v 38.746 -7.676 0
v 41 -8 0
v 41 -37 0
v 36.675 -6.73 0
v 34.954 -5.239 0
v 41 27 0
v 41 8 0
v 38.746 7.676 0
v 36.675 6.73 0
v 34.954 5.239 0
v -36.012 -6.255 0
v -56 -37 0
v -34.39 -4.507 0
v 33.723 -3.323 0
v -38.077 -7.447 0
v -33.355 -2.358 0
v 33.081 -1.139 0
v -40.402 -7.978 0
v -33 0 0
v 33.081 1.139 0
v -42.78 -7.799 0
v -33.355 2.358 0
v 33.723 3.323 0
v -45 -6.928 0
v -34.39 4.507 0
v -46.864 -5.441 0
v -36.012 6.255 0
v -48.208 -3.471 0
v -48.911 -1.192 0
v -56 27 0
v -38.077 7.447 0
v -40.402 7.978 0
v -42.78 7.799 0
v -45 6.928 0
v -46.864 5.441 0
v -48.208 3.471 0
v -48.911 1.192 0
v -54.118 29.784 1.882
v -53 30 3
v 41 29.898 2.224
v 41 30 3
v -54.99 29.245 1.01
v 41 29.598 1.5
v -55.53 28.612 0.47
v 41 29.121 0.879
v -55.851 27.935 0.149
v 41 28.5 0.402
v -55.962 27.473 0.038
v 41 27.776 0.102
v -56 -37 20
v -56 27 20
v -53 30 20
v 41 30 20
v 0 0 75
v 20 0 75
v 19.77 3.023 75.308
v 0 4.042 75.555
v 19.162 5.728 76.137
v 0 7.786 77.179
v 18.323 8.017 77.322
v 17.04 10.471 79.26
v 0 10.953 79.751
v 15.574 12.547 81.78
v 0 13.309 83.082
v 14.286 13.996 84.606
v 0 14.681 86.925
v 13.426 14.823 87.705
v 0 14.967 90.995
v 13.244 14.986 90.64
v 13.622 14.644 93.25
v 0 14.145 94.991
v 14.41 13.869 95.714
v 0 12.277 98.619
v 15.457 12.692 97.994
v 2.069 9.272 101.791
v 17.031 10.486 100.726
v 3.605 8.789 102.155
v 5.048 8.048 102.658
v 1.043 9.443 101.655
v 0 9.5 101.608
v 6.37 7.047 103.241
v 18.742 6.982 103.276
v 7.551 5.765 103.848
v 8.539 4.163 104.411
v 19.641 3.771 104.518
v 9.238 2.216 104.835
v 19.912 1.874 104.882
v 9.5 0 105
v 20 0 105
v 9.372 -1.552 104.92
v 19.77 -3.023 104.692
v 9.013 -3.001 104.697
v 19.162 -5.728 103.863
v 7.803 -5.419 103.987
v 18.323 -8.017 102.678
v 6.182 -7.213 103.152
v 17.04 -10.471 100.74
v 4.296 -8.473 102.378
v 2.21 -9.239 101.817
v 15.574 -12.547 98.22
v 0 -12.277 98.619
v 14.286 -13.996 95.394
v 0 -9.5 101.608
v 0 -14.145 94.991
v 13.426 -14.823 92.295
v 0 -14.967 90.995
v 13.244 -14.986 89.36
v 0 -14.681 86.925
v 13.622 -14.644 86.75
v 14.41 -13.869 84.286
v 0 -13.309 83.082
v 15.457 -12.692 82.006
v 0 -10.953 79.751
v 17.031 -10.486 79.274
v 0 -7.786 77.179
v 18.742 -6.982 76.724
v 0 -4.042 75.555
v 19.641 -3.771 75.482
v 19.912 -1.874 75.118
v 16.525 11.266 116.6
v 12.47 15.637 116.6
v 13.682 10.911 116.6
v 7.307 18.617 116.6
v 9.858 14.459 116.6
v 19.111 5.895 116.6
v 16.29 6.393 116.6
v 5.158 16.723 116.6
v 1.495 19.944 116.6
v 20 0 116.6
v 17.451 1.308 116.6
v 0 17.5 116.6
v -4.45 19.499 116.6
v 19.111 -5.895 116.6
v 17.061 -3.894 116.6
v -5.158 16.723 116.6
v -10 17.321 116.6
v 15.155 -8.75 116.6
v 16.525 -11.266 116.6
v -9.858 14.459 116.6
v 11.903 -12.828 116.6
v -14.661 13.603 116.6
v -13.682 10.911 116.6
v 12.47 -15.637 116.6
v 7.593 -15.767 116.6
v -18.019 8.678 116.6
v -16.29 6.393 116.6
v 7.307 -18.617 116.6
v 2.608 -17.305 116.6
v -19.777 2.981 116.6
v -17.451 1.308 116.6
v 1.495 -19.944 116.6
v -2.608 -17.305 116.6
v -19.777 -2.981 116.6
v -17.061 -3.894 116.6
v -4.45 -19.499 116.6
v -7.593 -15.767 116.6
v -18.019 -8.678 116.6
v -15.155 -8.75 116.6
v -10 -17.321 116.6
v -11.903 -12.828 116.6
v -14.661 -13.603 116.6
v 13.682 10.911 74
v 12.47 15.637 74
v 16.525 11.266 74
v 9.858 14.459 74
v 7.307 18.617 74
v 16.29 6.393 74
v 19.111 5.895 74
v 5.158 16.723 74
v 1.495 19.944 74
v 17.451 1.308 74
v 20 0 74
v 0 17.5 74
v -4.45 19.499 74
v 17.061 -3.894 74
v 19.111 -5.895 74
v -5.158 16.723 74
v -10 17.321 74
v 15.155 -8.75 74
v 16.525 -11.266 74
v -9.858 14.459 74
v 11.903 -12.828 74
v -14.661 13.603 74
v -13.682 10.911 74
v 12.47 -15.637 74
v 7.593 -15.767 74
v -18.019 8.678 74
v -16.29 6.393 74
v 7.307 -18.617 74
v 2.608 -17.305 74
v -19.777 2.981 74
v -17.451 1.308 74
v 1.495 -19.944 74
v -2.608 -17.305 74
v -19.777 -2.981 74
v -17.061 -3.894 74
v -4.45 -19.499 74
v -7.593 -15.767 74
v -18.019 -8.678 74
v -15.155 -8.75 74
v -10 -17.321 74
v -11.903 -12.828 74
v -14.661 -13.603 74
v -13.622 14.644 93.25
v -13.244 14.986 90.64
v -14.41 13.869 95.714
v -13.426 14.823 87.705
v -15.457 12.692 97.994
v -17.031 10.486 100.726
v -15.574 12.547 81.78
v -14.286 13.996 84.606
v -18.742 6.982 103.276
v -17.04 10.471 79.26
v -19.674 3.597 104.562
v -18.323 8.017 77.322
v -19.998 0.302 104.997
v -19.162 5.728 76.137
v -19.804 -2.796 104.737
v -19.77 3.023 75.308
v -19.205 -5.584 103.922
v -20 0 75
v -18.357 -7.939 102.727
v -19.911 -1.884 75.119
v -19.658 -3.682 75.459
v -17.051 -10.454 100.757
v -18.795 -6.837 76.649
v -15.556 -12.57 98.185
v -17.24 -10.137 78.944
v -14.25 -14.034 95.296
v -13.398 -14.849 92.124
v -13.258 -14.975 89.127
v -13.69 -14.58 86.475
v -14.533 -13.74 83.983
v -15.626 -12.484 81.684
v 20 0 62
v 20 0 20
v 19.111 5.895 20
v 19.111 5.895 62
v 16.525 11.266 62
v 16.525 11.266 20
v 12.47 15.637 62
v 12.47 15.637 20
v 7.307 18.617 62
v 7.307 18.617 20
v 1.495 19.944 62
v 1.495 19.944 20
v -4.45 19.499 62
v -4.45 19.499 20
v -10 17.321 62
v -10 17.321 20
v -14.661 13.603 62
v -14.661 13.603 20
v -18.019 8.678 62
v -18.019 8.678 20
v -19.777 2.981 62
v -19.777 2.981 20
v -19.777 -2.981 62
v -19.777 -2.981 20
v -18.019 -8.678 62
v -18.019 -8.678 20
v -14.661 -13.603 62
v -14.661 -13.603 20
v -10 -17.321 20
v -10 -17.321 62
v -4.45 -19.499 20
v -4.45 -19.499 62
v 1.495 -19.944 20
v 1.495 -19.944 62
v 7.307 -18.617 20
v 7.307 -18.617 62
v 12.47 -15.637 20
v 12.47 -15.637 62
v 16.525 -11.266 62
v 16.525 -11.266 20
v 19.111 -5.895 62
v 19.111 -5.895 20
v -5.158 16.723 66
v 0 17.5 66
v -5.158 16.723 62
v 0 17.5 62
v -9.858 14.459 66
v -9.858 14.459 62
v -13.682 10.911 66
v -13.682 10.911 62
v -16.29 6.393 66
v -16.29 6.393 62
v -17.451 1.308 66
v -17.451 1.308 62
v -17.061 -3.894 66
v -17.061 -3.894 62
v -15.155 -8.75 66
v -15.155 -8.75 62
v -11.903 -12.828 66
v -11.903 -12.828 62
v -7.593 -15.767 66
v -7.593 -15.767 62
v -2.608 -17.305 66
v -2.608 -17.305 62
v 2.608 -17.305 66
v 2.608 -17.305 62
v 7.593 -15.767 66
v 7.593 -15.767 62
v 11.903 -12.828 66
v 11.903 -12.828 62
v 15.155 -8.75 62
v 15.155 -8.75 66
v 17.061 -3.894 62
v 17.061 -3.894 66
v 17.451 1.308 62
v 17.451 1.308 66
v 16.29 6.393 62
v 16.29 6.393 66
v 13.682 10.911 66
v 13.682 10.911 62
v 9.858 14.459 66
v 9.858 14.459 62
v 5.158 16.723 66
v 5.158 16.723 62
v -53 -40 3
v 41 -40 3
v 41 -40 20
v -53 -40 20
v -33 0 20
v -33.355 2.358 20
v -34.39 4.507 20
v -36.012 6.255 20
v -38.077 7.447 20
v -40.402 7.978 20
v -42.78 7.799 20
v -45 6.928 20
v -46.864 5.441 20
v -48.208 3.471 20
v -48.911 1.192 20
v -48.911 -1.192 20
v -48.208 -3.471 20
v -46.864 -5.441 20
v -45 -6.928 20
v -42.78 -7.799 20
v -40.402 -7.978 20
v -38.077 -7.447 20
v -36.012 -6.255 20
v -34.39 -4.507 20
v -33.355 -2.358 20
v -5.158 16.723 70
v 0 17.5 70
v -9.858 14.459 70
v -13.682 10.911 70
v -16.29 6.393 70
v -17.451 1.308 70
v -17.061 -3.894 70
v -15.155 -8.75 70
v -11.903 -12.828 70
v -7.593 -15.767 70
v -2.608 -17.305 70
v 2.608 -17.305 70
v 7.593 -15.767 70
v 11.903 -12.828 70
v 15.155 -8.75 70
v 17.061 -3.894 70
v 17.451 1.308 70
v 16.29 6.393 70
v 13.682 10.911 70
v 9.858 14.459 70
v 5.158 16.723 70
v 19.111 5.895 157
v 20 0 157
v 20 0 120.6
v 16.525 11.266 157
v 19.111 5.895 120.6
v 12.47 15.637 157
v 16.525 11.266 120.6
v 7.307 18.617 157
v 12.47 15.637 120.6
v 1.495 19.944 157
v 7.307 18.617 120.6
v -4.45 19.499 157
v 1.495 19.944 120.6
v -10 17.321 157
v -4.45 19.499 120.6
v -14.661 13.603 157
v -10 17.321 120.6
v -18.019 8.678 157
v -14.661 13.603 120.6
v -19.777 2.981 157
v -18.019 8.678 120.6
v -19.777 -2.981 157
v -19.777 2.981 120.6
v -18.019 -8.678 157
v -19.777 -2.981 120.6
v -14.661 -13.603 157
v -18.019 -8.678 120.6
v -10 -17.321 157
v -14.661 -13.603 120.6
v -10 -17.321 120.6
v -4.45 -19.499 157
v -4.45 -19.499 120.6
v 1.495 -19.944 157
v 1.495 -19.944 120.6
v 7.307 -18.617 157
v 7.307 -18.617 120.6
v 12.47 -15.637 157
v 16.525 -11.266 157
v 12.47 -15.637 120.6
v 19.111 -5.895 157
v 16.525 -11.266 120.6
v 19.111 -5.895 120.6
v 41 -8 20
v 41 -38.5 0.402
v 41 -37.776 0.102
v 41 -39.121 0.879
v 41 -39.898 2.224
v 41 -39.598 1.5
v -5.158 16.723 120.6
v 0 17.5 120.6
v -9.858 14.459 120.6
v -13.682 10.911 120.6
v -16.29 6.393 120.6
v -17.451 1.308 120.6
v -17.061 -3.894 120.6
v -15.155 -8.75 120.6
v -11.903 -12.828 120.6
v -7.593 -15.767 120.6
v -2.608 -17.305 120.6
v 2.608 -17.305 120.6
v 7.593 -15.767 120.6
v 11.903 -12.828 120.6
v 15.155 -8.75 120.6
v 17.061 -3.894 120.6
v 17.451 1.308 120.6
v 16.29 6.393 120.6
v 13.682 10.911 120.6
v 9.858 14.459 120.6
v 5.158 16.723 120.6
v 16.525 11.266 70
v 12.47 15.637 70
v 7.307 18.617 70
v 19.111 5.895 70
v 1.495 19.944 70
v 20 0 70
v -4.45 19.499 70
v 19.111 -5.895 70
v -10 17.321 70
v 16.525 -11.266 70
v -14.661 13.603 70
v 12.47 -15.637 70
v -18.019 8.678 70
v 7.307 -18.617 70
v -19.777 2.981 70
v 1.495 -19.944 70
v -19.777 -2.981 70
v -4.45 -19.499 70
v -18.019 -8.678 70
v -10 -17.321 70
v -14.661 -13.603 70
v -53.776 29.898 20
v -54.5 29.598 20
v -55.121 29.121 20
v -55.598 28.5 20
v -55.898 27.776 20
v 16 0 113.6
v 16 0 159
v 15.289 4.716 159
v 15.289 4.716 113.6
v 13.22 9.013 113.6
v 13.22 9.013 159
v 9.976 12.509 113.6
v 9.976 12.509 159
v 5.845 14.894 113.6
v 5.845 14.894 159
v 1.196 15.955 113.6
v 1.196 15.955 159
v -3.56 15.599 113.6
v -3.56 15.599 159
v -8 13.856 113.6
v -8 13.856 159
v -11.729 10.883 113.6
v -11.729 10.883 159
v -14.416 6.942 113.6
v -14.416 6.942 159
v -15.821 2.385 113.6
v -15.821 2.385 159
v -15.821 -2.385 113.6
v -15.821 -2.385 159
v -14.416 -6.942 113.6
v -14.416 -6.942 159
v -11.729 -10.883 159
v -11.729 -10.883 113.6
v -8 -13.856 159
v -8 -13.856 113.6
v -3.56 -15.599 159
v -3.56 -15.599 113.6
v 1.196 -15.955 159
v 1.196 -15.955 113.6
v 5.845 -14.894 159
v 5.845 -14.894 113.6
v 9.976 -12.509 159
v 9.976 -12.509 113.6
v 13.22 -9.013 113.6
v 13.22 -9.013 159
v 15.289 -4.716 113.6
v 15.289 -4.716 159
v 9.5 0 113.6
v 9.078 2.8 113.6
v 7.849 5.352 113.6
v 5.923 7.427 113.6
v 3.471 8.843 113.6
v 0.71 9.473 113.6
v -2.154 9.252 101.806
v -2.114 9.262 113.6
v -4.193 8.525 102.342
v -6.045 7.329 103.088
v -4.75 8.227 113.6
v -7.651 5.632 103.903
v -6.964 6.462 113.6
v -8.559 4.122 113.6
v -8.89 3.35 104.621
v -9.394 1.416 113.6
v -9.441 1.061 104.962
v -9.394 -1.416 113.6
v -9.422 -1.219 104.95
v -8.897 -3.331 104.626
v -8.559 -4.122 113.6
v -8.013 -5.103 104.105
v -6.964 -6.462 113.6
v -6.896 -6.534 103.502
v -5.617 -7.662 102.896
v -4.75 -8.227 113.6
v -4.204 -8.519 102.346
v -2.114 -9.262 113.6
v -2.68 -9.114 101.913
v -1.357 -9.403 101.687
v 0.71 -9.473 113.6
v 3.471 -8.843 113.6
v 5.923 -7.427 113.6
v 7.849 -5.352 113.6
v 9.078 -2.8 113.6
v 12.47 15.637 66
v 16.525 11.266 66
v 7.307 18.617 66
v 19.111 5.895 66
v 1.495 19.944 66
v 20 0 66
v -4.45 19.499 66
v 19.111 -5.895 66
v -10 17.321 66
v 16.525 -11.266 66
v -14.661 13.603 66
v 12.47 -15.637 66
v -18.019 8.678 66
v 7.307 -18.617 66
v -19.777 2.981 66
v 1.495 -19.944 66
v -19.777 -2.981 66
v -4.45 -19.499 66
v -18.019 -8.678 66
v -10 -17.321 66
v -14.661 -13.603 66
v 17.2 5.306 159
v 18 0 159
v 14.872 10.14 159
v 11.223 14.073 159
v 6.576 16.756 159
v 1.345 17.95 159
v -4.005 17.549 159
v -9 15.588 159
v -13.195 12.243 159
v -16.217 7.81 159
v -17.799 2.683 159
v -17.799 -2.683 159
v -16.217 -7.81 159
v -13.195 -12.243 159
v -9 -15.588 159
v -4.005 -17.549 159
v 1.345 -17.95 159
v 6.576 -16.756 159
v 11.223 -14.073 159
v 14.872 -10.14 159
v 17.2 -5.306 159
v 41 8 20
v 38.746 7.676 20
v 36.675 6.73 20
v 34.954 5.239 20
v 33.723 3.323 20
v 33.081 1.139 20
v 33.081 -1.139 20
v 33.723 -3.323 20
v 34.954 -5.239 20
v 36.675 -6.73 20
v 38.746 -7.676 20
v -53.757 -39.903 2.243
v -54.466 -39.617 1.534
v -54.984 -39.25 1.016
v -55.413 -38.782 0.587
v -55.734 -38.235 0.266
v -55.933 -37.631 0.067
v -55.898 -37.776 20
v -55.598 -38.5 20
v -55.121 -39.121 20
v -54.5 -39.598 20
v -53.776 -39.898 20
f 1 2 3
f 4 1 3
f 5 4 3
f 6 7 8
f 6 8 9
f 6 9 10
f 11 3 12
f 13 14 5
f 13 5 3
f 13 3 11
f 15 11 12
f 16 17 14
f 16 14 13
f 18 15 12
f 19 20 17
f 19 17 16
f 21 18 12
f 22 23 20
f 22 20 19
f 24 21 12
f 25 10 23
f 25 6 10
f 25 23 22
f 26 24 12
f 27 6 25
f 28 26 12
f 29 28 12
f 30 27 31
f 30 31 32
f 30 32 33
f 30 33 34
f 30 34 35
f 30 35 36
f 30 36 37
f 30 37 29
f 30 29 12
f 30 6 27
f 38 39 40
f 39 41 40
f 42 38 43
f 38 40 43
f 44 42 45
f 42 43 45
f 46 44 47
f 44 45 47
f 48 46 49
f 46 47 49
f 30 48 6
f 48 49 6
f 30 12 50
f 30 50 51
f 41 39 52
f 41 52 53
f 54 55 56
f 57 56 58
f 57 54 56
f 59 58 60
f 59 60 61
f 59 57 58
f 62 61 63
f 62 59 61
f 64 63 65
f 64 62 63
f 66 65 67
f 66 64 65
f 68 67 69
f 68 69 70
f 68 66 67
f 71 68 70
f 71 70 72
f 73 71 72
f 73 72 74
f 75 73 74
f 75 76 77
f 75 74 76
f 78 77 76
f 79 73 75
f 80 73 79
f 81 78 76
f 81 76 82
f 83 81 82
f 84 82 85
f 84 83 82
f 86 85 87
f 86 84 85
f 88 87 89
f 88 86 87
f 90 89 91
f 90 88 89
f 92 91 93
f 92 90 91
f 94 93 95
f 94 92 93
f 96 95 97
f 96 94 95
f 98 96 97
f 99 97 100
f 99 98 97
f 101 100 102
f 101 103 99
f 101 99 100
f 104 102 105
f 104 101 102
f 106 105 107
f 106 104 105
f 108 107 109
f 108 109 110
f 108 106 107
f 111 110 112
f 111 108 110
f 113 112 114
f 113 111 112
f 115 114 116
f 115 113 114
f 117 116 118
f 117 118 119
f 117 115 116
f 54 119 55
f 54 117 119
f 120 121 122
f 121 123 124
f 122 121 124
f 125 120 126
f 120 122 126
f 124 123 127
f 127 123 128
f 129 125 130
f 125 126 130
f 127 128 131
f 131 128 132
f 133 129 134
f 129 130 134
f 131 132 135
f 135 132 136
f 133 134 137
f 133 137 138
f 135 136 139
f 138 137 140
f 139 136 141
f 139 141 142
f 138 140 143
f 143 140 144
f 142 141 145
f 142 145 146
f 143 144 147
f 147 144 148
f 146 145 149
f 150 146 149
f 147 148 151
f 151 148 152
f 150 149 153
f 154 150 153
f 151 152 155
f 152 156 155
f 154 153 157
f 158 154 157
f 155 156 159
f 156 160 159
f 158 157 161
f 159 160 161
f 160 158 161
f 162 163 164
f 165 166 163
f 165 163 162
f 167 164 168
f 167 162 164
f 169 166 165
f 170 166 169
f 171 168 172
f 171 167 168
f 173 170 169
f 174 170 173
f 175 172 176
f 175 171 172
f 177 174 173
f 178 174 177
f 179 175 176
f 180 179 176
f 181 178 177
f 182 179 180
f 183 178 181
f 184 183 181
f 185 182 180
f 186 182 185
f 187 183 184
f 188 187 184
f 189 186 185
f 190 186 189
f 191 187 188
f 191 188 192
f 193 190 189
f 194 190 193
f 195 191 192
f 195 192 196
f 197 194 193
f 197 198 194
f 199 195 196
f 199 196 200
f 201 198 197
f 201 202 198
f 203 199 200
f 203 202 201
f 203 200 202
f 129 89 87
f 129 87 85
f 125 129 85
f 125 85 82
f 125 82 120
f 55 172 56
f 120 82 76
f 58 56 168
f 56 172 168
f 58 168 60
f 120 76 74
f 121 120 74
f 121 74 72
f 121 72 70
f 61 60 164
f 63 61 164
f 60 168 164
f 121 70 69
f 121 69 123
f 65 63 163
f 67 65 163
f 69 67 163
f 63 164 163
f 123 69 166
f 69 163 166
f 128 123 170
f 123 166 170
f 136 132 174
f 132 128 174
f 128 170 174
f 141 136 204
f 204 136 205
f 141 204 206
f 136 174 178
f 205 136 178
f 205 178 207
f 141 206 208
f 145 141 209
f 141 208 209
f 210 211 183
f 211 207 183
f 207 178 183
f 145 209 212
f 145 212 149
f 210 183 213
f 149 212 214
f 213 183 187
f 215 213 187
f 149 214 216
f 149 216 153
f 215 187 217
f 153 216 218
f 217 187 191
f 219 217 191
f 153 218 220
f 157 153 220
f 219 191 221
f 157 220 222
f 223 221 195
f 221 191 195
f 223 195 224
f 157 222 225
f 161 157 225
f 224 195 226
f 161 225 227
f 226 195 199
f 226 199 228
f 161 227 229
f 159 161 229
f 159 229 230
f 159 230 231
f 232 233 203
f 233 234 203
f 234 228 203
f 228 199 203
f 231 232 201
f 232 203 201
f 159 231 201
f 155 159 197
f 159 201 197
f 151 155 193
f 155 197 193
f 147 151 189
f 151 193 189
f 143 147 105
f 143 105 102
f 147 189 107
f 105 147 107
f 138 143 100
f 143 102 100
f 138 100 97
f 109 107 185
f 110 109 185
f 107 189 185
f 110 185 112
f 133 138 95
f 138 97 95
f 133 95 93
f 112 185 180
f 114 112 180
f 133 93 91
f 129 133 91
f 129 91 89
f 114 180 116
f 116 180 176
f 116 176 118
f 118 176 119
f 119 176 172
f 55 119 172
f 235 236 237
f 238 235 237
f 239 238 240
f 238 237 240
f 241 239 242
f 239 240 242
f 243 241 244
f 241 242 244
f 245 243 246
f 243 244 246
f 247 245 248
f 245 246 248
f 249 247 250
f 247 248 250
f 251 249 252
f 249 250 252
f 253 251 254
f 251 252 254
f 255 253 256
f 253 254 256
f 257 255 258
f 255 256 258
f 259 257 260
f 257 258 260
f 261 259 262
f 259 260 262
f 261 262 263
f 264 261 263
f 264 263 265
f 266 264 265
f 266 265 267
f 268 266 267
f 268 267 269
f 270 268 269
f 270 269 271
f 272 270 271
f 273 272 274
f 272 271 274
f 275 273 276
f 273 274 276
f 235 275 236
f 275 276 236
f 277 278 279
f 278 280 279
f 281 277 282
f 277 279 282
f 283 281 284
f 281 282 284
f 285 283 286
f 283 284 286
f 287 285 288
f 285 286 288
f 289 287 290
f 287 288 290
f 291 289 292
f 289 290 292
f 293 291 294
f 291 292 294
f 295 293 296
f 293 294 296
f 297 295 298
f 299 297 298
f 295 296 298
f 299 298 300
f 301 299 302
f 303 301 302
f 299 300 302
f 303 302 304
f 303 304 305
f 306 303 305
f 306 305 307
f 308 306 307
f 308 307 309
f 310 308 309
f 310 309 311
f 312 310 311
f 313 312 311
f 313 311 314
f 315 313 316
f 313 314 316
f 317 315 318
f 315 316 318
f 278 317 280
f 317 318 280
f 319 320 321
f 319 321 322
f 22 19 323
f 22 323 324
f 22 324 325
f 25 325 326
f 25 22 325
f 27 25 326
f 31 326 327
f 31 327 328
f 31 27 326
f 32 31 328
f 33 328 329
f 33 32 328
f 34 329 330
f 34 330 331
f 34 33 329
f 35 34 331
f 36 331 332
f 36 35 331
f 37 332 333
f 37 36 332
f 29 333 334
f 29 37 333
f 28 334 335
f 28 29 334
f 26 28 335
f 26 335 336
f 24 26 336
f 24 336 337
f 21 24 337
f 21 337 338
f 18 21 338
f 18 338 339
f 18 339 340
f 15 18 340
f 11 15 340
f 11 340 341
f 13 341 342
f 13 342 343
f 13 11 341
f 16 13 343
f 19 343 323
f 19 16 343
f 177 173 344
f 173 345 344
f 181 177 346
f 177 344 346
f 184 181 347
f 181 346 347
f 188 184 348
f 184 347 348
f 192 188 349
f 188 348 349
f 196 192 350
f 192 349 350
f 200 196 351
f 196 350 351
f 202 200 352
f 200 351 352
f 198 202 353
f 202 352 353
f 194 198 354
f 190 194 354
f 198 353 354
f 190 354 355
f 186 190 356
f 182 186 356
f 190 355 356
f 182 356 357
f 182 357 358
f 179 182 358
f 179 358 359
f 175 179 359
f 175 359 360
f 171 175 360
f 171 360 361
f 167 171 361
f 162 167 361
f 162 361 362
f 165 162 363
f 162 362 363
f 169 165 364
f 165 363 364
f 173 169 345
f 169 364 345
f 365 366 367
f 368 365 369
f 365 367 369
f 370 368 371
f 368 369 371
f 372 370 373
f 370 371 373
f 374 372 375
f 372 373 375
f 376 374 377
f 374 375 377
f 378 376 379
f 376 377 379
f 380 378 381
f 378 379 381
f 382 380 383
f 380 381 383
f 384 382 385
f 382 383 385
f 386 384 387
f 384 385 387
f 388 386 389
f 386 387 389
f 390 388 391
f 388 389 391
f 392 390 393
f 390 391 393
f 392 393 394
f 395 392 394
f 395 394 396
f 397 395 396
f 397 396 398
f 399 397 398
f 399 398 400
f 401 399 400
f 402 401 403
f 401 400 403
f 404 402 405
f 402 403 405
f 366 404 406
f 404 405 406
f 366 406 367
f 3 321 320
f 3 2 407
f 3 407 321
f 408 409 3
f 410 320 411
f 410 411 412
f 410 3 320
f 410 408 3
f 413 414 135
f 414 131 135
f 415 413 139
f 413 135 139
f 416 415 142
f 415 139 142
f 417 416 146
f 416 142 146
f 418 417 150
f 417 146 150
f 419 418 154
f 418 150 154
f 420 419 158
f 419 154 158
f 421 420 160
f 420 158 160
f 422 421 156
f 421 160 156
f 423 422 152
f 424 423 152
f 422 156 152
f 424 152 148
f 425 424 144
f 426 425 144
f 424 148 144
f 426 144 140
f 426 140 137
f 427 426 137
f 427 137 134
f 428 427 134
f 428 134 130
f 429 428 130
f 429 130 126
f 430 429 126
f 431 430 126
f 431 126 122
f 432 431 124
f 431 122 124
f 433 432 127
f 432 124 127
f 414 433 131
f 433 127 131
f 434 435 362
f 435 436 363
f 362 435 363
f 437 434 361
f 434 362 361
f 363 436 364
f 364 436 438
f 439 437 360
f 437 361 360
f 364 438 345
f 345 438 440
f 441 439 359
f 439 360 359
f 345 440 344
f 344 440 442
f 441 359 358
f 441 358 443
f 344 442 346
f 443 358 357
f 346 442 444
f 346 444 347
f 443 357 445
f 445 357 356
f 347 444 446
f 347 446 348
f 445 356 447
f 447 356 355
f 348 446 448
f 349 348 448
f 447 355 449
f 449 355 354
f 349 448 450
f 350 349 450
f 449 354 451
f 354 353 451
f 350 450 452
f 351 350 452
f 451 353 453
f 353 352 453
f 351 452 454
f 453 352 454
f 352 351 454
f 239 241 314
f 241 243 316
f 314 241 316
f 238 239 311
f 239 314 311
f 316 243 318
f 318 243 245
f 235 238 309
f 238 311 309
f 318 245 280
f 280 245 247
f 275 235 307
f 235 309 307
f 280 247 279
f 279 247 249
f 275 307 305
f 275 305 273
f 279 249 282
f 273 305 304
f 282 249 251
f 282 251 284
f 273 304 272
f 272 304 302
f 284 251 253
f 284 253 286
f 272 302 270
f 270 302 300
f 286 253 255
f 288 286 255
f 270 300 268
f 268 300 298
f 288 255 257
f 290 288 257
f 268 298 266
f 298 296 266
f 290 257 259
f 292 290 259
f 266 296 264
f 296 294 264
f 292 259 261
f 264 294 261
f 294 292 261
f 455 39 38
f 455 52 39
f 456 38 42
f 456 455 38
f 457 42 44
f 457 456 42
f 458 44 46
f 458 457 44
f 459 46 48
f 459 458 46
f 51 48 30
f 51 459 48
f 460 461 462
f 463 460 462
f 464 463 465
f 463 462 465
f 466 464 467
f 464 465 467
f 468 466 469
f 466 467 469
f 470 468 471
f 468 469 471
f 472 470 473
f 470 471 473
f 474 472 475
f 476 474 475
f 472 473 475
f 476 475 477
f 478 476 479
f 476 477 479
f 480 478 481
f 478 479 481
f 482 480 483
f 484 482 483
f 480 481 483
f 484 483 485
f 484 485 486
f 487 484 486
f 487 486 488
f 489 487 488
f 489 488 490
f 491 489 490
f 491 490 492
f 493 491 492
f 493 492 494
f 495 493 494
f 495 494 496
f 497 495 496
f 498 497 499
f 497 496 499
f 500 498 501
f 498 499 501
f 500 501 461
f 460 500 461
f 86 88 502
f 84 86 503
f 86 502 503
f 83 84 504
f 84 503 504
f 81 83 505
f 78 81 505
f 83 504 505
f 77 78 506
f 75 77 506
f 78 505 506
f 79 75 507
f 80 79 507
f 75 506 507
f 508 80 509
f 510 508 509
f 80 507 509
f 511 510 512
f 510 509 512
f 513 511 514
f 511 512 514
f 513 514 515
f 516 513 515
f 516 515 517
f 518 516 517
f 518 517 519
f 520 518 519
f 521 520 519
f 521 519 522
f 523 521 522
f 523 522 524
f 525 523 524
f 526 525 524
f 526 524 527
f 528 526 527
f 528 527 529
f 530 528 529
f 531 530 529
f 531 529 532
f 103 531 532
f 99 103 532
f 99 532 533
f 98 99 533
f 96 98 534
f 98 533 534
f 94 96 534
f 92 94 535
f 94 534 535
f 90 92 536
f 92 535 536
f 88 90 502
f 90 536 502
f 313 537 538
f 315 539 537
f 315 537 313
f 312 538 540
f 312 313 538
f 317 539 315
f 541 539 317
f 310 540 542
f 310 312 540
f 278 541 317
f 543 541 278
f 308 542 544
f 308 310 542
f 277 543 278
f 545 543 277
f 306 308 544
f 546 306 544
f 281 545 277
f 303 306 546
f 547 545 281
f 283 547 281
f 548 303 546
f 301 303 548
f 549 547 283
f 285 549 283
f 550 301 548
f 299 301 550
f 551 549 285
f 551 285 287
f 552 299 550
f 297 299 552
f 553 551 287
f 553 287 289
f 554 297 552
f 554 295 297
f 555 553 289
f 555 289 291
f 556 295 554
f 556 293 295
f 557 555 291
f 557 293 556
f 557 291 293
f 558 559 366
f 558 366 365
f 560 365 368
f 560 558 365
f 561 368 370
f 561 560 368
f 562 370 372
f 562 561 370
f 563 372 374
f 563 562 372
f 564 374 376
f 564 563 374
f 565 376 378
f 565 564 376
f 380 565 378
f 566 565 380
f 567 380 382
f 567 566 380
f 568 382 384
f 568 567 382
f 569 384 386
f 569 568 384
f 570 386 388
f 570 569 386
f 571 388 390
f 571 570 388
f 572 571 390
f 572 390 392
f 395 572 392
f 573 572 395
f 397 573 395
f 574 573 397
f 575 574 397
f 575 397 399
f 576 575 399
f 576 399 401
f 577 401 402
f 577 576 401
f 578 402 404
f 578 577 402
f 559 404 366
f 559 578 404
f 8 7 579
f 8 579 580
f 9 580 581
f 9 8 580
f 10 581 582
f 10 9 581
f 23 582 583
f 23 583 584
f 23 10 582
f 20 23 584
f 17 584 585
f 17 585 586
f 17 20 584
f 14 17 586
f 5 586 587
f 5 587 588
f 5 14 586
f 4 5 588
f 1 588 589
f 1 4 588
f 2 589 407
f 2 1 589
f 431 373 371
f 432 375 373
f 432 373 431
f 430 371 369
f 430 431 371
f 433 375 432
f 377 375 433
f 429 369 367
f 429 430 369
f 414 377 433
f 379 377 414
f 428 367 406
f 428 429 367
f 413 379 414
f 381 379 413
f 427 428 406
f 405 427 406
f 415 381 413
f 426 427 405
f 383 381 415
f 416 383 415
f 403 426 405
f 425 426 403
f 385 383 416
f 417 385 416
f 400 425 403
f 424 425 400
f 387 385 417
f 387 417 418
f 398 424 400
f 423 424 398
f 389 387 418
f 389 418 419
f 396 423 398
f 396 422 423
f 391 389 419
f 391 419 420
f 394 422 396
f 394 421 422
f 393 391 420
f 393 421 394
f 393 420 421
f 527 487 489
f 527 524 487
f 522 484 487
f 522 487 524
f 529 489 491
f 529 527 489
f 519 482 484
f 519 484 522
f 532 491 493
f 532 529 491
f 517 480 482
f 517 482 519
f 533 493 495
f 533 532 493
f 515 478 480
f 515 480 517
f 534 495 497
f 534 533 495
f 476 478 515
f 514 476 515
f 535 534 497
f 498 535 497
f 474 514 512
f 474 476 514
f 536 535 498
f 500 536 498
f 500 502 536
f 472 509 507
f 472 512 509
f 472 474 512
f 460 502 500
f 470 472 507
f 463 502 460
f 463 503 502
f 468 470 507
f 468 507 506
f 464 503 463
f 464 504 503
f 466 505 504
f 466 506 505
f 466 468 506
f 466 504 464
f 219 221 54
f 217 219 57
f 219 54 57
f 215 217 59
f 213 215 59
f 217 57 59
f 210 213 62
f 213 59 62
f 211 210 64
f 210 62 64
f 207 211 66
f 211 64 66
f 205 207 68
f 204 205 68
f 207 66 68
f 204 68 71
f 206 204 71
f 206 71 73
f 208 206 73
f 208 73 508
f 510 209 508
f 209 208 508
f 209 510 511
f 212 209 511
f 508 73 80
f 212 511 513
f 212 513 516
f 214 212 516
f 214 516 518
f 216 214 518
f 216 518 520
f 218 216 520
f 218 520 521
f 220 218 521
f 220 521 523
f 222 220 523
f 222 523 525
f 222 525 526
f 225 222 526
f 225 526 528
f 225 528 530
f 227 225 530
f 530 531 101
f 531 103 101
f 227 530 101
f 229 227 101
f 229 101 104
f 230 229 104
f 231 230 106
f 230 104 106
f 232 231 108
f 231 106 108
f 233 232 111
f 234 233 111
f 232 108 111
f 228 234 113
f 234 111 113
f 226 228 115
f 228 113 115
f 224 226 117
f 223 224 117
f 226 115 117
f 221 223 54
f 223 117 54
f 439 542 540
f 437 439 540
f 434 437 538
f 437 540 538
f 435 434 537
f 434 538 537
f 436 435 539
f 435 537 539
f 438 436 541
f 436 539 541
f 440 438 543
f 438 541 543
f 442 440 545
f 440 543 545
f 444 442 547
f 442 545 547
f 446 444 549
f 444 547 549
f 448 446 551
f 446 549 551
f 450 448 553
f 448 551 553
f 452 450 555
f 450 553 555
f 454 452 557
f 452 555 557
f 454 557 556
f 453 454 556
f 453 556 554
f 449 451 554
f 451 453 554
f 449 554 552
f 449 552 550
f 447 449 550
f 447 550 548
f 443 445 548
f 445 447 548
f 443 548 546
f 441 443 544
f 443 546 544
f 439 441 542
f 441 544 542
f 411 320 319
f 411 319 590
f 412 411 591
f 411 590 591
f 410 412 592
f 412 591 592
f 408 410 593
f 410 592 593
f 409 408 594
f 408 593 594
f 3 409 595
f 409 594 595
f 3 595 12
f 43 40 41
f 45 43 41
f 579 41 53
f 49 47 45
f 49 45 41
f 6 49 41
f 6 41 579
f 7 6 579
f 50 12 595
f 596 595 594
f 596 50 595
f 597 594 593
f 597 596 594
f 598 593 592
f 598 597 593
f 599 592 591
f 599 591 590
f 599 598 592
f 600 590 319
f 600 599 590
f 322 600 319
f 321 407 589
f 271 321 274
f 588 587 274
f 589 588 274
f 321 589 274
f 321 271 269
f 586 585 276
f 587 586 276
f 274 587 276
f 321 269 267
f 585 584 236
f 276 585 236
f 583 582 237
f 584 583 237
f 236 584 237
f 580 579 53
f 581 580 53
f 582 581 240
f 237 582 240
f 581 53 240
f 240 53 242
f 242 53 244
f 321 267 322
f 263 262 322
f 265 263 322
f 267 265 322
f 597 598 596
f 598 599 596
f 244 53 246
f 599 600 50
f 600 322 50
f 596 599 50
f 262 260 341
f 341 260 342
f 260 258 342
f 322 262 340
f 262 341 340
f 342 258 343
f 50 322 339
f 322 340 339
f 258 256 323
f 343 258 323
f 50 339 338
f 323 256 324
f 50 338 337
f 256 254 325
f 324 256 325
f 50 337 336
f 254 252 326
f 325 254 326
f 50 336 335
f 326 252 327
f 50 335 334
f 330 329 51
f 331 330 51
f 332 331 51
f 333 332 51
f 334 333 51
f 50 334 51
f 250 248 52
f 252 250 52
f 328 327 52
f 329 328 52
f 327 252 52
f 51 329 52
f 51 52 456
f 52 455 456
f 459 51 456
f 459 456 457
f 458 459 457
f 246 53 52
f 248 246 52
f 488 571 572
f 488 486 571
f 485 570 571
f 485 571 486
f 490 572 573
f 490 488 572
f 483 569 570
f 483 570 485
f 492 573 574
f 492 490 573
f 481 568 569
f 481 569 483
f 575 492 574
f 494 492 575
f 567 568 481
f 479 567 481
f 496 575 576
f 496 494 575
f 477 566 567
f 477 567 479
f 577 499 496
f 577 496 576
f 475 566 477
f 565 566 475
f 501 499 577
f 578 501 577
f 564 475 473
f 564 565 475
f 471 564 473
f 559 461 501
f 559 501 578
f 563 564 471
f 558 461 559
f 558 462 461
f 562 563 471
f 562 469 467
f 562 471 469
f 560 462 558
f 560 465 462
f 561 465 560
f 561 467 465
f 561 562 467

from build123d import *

# Parameters (mm, degrees)
SKETCH1_R               = 8
BOSS_EXTRUDE1_DEPTH     = 20
SKETCH2_R               = 20
BOSS_EXTRUDE2_DEPTH     = 139
SKETCH3_R               = 15
CUT_EXTRUDE1_DEPTH      = 42
CUT_EXTRUDE1_DEPTH_BACK = 57
SKETCH4_W               = 4
SKETCH4_H               = 2.5
SKETCH5_R               = 16
CUT_EXTRUDE2_DEPTH      = 45.4
SKETCH6_R               = 9.5
CUT_EXTRUDE3_DEPTH      = 12
CHAMFER1_SIZE           = 2
FILLET1_R               = 3


with BuildPart() as part:
    # Sketch1 → Boss-Extrude1 (new body)
    with BuildSketch(Plane.XY):
        with BuildLine():
            Line((-56, 30), (41, 30))
            Line((41, 30), (41, 8))
            ThreePointArc((41, 8), (33, 0), (41, -8))
            Line((41, -8), (41, -40))
            Line((41, -40), (-56, -40))
            Line((-56, -40), (-56, 30))
        make_face()
        with Locations((-41, 0)):
            Circle(SKETCH1_R, mode=Mode.SUBTRACT)
    extrude(amount=BOSS_EXTRUDE1_DEPTH)

    # Sketch2 → Boss-Extrude2 (add)
    with BuildSketch(Plane.XY.offset(20)):
        Circle(SKETCH2_R)
    extrude(amount=BOSS_EXTRUDE2_DEPTH)

    # Sketch3 → Cut-Extrude1 (cut, two sides)
    with BuildSketch(Plane(origin=(0, 0, 0), x_dir=(0, 0, -1), z_dir=(1, 0, 0))) as cut_extrude1_sk:
        with Locations((-90, 0)):
            Circle(SKETCH3_R)
    extrude(amount=CUT_EXTRUDE1_DEPTH, mode=Mode.SUBTRACT)
    extrude(cut_extrude1_sk.sketch, amount=-CUT_EXTRUDE1_DEPTH_BACK, mode=Mode.SUBTRACT)

    # Sketch4 → Cut-Revolve1 (revolve, cut)
    with BuildSketch(Plane(origin=(0, 0, 0), x_dir=(0, 0, -1), z_dir=(1, 0, 0))):
        with Locations((-64, 18.75)):
            Rectangle(SKETCH4_W, SKETCH4_H)
        with Locations((-72, 18.75)):
            Rectangle(SKETCH4_W, SKETCH4_H)
        with Locations((-118.6, 18.75)):
            Rectangle(SKETCH4_W, SKETCH4_H)
    revolve(axis=Axis((0, 0, 0), (0, 0, 1)), mode=Mode.SUBTRACT)

    # Sketch5 → Cut-Extrude2 (cut)
    with BuildSketch(Plane.XY.offset(159)):
        Circle(SKETCH5_R)
    extrude(amount=-CUT_EXTRUDE2_DEPTH, mode=Mode.SUBTRACT)

    # Sketch6 → Cut-Extrude3 (cut)
    with BuildSketch(Plane.XY.offset(113.6)):
        Circle(SKETCH6_R)
    extrude(amount=-CUT_EXTRUDE3_DEPTH, mode=Mode.SUBTRACT)

    # Chamfer1
    chamfer1_edges = [part.edges().sort_by_distance(p)[0] for p in [
        (-20, 0, 159),
    ]]
    chamfer(chamfer1_edges, length=CHAMFER1_SIZE)

    # Fillet1
    fillet1_edges = [part.edges().sort_by_distance(p)[0] for p in [
        (-56, 30, 10),
        (-56, -40, 10),
        (-7.5, 30, 0),
        (-7.5, -40, 0),
    ]]
    fillet(fillet1_edges, radius=FILLET1_R)


solid = part.part
